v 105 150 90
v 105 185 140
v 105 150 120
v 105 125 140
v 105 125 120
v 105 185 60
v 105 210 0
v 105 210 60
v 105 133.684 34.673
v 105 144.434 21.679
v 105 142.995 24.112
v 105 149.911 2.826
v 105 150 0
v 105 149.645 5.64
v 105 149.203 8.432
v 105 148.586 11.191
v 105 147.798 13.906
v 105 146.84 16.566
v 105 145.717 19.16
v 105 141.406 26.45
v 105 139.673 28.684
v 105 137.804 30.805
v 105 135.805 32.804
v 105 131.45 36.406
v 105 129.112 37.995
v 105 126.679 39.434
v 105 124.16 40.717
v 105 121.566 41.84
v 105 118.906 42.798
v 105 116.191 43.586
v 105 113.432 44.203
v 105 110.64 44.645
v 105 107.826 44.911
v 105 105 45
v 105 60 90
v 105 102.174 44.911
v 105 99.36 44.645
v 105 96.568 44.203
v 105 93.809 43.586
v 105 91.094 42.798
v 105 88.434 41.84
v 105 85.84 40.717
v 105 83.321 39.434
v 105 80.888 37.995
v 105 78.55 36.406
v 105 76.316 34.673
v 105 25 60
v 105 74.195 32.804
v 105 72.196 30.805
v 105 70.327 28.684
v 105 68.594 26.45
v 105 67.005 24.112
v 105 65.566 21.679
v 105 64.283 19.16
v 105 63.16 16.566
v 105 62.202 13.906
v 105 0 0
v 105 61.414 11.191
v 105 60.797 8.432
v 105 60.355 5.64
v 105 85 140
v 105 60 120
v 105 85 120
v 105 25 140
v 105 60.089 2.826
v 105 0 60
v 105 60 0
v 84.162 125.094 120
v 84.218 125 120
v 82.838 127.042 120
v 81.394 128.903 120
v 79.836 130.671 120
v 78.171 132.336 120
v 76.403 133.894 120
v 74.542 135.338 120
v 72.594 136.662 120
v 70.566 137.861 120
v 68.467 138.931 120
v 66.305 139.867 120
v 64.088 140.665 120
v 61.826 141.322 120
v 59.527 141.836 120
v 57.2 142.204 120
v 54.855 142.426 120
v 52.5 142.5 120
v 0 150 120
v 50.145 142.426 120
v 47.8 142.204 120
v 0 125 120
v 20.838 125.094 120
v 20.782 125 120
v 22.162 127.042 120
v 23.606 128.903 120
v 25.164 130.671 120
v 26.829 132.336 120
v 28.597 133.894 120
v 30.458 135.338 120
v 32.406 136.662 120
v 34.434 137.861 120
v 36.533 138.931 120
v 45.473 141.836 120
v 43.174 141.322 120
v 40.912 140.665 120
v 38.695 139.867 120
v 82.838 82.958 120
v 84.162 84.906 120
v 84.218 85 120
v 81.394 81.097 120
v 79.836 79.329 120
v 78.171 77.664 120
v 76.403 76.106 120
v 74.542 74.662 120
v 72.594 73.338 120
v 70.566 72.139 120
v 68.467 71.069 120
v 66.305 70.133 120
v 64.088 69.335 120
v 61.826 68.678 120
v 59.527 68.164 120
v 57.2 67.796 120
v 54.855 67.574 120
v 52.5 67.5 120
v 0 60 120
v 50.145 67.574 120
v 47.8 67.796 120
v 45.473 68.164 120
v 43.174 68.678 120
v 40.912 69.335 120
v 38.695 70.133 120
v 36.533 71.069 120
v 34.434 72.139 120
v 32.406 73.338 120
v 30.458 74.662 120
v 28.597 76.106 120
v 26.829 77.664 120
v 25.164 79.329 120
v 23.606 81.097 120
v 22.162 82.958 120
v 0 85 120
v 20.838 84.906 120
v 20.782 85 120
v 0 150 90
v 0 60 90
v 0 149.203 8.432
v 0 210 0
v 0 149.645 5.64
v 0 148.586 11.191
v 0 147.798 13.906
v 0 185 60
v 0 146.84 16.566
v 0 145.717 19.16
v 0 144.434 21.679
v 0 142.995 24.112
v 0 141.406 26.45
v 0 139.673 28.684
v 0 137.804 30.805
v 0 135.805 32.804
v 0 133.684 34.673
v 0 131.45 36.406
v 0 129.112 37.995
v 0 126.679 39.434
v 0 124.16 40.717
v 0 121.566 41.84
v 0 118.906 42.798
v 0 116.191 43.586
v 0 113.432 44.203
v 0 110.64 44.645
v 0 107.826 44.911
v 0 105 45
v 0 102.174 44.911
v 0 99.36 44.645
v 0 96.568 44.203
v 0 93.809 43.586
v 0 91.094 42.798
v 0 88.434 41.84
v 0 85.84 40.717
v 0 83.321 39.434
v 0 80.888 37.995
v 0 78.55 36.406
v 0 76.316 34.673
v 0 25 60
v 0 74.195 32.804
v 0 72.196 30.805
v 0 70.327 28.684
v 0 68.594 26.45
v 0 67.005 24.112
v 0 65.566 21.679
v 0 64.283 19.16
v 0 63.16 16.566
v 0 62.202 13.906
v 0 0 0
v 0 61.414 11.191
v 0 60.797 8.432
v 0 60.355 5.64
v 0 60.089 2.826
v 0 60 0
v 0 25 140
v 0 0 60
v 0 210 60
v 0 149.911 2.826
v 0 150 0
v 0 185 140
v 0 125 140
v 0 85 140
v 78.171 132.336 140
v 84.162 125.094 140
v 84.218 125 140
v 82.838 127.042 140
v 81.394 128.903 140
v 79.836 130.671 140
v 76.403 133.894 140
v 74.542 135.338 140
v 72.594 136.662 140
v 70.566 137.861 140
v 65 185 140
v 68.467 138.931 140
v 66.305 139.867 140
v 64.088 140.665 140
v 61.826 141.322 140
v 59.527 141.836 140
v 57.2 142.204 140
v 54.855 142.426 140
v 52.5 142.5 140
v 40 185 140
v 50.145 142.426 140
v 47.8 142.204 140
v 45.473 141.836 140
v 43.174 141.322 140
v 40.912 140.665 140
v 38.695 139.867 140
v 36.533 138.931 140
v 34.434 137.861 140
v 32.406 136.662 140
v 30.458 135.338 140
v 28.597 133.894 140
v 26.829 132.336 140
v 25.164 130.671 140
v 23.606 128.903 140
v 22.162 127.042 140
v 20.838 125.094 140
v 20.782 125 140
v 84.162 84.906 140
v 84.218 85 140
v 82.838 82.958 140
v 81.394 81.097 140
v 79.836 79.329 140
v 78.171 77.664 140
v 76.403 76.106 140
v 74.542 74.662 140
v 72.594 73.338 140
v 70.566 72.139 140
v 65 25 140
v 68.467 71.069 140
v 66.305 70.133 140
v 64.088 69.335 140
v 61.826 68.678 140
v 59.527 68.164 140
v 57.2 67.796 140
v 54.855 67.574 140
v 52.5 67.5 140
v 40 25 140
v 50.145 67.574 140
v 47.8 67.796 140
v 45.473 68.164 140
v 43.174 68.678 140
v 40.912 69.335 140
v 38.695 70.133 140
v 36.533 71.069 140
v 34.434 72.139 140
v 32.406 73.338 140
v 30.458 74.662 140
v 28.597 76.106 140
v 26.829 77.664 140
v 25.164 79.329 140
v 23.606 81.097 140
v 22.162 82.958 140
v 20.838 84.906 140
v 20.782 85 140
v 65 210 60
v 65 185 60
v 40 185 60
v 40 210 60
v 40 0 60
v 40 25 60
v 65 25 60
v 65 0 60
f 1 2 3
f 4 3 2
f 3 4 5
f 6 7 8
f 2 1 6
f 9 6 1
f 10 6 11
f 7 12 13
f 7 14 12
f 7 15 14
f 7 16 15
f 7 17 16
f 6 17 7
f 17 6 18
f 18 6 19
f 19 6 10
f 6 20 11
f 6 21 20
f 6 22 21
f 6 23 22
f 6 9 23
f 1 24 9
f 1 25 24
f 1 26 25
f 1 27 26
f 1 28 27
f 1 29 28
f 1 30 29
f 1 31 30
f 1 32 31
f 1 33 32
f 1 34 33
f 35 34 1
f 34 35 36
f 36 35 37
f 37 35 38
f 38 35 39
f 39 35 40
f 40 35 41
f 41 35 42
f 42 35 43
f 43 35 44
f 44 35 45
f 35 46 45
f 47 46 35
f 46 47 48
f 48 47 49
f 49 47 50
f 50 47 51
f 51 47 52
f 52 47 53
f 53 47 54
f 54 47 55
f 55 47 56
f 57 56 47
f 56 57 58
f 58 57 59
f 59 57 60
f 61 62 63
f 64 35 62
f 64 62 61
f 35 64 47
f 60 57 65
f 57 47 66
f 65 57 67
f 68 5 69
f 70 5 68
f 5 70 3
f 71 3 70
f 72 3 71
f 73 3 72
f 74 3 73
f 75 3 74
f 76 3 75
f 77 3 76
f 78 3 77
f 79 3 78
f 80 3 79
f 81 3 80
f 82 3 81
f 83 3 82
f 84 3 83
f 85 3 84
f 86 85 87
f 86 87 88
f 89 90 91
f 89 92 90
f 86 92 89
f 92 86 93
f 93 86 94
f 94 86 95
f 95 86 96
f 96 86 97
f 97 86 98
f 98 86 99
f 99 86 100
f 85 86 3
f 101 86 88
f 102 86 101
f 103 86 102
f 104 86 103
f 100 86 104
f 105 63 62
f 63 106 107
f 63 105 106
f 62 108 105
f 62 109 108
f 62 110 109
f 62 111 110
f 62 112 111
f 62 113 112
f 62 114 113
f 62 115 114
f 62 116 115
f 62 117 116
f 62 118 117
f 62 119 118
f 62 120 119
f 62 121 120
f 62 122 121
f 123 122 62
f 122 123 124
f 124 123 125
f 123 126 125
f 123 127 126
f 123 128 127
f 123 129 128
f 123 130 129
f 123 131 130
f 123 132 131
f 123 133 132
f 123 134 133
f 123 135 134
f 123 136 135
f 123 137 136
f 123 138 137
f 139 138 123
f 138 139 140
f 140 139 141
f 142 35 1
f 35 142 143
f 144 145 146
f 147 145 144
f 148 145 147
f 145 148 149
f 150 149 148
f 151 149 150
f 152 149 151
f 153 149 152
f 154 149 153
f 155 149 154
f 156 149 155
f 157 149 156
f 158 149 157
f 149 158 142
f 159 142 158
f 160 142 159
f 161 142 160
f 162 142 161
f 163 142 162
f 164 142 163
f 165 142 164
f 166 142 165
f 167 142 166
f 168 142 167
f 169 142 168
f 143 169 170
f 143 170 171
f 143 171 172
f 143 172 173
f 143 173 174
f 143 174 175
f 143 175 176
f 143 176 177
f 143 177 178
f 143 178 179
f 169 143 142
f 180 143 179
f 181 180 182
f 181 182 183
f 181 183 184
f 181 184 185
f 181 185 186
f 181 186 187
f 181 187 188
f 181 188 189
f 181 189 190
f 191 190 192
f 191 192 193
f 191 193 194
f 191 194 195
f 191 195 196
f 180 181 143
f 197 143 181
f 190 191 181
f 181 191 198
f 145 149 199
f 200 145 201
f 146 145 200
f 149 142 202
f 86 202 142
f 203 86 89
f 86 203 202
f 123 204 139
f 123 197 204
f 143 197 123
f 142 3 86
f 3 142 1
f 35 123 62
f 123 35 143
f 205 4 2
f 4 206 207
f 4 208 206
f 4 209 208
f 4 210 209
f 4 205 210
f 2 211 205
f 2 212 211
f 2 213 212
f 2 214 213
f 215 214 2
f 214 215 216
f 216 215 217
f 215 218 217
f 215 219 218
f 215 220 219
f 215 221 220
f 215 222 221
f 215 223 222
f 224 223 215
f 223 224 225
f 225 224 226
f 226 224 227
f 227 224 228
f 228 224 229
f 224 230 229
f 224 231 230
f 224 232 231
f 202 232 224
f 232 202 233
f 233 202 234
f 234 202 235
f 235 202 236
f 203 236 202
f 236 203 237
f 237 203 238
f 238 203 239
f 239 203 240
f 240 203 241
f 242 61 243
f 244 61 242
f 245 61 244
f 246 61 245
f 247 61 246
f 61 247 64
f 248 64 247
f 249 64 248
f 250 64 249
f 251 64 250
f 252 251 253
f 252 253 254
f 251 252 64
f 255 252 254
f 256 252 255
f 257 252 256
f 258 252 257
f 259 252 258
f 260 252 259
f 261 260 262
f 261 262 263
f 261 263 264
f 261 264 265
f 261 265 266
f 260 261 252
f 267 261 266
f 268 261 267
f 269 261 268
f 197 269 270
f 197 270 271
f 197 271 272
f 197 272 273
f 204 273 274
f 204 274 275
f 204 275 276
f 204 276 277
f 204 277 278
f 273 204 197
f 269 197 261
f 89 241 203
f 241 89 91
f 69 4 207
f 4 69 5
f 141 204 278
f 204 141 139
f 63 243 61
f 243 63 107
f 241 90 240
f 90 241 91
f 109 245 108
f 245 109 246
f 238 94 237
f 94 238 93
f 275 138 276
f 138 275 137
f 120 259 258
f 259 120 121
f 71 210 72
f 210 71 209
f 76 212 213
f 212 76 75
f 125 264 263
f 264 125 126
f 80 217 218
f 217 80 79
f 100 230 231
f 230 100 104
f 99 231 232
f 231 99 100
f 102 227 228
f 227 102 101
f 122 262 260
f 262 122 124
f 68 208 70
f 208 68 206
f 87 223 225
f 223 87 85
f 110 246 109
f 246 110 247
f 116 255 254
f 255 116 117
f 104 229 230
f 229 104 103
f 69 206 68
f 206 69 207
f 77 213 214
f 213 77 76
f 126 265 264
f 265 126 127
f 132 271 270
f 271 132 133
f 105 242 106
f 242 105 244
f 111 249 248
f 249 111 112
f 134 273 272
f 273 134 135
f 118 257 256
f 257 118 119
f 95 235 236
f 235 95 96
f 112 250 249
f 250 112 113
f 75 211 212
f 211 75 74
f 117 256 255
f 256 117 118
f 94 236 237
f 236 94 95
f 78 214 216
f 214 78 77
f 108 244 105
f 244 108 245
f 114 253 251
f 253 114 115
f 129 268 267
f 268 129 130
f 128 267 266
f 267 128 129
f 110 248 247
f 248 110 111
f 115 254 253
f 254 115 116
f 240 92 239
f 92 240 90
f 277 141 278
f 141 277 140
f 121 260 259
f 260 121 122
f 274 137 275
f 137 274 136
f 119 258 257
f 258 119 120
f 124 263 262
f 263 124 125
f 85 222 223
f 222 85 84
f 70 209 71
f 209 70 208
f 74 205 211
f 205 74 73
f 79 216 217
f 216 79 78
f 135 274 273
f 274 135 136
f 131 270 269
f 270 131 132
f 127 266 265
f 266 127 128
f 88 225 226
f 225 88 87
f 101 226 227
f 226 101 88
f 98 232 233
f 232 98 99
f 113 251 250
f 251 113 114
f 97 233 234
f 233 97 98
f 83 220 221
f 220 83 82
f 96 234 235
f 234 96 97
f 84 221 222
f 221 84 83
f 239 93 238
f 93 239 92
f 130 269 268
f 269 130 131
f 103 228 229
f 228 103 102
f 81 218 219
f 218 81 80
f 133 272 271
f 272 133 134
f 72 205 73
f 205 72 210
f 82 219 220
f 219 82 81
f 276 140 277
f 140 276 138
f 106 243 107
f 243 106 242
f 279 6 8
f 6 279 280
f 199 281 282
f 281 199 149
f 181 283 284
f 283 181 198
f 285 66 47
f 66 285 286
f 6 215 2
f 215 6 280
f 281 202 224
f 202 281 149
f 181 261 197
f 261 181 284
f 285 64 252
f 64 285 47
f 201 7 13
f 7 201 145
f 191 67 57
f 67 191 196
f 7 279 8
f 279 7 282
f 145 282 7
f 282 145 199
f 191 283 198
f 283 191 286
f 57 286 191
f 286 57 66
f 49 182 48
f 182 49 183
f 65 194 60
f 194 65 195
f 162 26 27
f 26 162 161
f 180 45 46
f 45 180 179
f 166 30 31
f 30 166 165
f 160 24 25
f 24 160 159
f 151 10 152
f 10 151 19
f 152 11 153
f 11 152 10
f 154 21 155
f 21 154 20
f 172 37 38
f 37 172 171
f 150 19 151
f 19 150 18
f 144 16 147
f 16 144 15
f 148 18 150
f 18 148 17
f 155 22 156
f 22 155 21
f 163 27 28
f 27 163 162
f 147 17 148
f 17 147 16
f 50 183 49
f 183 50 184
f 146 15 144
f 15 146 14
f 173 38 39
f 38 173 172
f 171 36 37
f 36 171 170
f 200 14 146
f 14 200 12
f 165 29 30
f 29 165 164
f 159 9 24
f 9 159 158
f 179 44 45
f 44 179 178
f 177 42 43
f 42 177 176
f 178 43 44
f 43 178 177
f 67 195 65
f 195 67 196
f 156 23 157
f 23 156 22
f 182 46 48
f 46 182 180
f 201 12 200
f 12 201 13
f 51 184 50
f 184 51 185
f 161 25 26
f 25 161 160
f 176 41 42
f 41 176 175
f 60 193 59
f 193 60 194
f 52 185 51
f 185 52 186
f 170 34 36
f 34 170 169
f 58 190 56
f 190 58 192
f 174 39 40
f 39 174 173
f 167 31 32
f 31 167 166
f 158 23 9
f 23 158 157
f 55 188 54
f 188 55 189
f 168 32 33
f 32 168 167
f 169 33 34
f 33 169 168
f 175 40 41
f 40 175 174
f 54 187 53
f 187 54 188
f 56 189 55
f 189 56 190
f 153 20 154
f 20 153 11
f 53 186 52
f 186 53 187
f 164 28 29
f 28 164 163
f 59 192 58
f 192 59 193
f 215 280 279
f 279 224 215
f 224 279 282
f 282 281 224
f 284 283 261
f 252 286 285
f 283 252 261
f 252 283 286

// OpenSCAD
// file: ../lib.scad
/*
 * Make a pair of an object.
 *
 * @param split The distance to seperate the pair.
 *
 * @param rot An optional amount to rotate the pair.
 *
 * @param edge Center on the left of the pair rather than the middle.
 *
 * @pair mirrored Make the left a mirror of the right instead of a
 *                rotation.
 */
module pair(split,rot=0,edge=false/*, mirrord=false*/){
     module center(){
	  if(edge){
	       translate([split/2,0,0]){
		    children();}}
	  else{
	       children();}}
     rotate([0,0,rot]){
	  center(){
	       translate([split/2,0,0]){
		    children();}
	       translate([-split/2,0,0]){
		    rotate([0,0,180]){
			 children();}}}}}

module xpair(split,rot=0,edge=false){
     pair(split,rot,edge){
	  children();}}
module ypair(split,rot=0,edge=false){
     rotate(90){
	  pair(split,rot,edge){
	       rotate(-90){
		    children();}}}}

/*
 * Make a pair but with a middle element.
 *
 * @param split The distance to seperate the pair.
 *
 * @param rot An optional amount to rotate the pair.
 */
module tripple(split,rot=0){
     rotate([0,0,90]){
	  children();}
     pair(split,rot){
	  children();}}
/*
 * Make a set of objects in a circle.
 *
 * @param count The number of elements in the circle
 *
 * @param r The raius of the circle.
 */
module set(count,r){
     for(i=[0:count]){
	  rotate([0,0,360/count*i]){
	       translate([r,0,0]){
		    children();}}}}

module set_better(count,radius,r,diameter,d){
     module set_impl(count,r){
	  for(i=[0:count]){
	       rotate([0,0,360/count*i]){
		    translate([r,0,0]){
			 children();}}}}
     if(!count){
	  //error
     }
     if(radius){
	  if(r || diameter || d){
	       // error
	  }else{
	       set_impl(count,radius){
		    children();}}}
     if(r){
	  if(radius || diameter || d){
	       // error
	  }else{
	       set_impl(count,r){
		    children();}}}
     if(diameter){
	  if(radius || r || d){
	       // error
	  }else{
	       set_impl(count,diameter/2){
		    children();}}}
     if(d){
	  if(radius || r || diameter){
	       // error
	  }else{
	       set_impl(count,d/2){
		    children();}}}}

/*
 * A quick rename of translate along z.
 *
 * @param distance The distance to lift by.
 */
module up(distance){
     translate([0,0,distance]){
	  children();}}

module arch(radius,height,thickness){
     cylinder(r=radius,h=thickness);
     translate([0,-radius,0]){
	  cube([height-radius,2*radius,thickness]);}}
// main file
$fn=100;
mm=1; // define units
degrees=1;

use <../lib.scad>;

module example_110(){
     top_width=160*mm;
     length=105*mm;
     top_height=80*mm;
     bottom_height=60*mm;
     bottom_width=210*mm;
     module top_half(){
	  module socket(){
	       socket_height=50*mm;
	       translate([0,top_width/2,top_height-socket_height]){
		    translate([0,-90/2,0])cube([length,90,30]);
		    translate([0,-40/2,0])cube([length,40,socket_height]);
		    translate([length/2,0,0])cylinder(r=37.5,h=socket_height);}}
	  difference(){
	       cube([length,top_width,top_height]);
	       socket();
	  }
     }
     module bottom_half(){
	  difference(){
	       cube([length,bottom_width,bottom_height]);
	       translate([0,bottom_width/2,0])rotate([0,90])cylinder(r=45,h=length);
	  }
     }
     module supports(){
	  translate([length/2,bottom_width/2,bottom_height]){
	       pair(top_width,90){
		    translate([0,-25/2,0]){
			 rotate([0,-90,-90]){
			      linear_extrude(25){
				   polygon([[0,0],[top_height,0],[0,25]]);}}}}}}
     translate([0,(bottom_width-top_width)/2,bottom_height])top_half();
     bottom_half();
     supports();
}

example_110();
